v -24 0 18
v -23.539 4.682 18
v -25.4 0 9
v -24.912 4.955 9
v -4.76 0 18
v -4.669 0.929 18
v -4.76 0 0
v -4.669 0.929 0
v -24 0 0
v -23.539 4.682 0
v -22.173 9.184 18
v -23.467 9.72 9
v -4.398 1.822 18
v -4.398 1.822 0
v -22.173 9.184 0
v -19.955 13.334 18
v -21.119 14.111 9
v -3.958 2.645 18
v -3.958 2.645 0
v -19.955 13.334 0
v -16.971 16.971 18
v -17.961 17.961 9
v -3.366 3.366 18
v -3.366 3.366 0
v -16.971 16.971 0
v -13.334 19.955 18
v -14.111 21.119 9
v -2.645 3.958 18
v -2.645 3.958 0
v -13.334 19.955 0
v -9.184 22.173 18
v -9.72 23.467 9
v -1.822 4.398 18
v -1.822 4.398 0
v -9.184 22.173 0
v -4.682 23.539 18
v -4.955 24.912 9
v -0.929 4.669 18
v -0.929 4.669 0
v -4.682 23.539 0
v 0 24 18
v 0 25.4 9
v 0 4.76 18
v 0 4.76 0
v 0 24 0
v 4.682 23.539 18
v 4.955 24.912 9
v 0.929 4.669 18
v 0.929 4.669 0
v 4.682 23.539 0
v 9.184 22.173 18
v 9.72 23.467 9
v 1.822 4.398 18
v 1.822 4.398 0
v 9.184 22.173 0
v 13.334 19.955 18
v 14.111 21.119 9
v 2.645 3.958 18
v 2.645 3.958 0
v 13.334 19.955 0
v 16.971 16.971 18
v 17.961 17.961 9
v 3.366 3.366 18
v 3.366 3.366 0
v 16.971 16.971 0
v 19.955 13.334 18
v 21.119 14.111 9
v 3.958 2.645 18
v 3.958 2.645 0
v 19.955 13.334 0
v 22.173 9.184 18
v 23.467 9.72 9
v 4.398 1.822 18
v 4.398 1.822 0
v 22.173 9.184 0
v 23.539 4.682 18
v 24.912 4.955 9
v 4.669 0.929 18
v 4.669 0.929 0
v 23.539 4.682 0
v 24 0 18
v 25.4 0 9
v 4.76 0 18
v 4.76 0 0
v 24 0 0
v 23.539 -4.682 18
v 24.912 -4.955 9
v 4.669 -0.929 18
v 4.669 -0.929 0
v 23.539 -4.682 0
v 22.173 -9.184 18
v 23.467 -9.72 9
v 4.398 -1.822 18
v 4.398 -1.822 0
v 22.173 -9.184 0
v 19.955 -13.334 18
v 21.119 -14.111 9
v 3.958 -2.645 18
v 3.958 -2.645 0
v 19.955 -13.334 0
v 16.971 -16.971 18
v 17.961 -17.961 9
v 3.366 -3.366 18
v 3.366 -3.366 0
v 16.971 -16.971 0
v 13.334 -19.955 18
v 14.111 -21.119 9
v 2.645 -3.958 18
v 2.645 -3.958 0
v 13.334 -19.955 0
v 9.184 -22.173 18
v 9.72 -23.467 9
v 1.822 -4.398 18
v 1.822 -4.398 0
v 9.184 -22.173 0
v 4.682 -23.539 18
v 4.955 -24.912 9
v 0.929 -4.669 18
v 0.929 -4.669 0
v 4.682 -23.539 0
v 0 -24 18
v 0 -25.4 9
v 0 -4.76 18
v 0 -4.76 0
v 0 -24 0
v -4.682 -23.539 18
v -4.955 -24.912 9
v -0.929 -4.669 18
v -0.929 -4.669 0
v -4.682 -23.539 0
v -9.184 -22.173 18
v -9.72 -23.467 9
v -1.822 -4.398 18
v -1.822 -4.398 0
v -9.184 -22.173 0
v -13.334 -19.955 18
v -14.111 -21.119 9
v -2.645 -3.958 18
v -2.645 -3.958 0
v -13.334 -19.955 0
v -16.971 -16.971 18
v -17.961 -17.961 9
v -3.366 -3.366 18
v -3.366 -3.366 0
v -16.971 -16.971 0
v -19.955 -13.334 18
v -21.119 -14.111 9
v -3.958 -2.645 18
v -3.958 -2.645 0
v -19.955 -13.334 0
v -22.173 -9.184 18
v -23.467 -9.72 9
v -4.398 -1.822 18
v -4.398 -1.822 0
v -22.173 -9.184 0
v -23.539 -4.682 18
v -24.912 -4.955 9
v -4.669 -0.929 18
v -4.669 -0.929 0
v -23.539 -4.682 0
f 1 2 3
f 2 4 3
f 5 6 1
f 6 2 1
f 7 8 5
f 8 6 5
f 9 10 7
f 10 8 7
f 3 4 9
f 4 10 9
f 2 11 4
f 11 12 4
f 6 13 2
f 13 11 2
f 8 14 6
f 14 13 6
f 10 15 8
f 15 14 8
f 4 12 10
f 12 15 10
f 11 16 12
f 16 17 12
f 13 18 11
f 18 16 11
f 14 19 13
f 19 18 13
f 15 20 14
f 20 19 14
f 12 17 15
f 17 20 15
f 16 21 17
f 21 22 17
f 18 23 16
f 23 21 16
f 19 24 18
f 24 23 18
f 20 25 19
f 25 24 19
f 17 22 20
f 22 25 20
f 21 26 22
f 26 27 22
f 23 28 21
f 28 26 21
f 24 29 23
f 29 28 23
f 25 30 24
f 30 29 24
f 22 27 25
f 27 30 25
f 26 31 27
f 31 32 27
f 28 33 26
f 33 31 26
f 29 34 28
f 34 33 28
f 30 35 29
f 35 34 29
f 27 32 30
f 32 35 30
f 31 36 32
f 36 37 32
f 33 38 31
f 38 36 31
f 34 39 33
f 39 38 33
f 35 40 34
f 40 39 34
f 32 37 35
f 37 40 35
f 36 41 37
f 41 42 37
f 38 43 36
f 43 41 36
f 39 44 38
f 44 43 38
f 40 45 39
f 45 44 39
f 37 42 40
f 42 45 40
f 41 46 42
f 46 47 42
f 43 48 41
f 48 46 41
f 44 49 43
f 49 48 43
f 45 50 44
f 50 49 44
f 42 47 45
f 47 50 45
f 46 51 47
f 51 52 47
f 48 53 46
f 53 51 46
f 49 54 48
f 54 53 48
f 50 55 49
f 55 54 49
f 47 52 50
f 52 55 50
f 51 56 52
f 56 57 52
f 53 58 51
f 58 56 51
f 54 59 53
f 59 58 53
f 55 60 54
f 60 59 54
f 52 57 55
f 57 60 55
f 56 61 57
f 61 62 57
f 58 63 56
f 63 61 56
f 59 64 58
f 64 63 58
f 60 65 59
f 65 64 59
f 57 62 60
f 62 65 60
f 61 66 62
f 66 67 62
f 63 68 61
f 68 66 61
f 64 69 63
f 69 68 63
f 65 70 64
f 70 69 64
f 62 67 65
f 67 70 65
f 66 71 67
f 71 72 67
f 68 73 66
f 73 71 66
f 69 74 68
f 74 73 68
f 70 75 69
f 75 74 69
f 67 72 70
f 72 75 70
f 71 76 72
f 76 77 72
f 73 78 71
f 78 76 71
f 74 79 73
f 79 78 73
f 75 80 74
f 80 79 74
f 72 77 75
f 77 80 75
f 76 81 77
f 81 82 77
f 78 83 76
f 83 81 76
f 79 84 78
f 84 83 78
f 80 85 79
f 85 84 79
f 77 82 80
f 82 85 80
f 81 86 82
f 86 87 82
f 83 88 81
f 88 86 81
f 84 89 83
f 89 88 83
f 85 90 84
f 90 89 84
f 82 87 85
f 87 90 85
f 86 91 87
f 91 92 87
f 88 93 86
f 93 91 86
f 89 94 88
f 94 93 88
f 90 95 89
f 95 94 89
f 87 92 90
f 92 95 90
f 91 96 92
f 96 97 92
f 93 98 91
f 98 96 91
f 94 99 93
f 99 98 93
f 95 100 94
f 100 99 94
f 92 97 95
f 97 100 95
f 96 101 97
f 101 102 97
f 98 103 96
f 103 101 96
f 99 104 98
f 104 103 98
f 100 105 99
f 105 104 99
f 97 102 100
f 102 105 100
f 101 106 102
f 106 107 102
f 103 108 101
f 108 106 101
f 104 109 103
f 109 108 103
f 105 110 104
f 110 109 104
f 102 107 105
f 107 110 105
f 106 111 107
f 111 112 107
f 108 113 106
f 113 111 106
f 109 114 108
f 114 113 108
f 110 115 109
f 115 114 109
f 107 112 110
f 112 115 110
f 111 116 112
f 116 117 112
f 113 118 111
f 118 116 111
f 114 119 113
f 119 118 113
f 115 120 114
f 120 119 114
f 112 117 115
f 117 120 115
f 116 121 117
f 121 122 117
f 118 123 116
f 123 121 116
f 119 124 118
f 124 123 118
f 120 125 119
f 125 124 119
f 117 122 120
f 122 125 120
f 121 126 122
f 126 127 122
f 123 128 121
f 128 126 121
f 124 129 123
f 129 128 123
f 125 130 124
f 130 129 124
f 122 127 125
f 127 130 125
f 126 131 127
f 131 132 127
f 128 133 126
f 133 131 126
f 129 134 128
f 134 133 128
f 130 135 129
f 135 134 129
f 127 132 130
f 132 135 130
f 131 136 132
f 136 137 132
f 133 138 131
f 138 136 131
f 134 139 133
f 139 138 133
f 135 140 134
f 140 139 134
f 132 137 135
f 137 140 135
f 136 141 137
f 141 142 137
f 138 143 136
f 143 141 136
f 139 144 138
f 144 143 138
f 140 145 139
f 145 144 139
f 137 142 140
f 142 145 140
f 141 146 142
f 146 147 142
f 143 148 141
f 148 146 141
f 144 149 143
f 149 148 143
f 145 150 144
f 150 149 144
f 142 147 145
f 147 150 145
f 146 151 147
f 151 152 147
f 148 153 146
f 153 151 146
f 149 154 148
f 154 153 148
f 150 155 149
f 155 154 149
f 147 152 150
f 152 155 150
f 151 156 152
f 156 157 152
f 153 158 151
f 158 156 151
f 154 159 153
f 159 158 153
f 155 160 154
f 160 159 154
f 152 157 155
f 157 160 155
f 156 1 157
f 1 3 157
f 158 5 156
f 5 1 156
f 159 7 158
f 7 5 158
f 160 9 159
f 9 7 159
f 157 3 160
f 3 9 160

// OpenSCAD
$fn = 32;

// ----------------------------------------------------------------------
// Belt roller: 48 mm barrel, 18 mm wide, bore 9.52 mm
// ----------------------------------------------------------------------

// --- parameters (mm) ---
bore_d = 9.52;            // bore
barrel_d = 48;            // barrel diameter
roller_w = 18;            // roller width
crown = 1.4;              // crown height at mid width

roller_profile = [[4.76, 0], [24, 0], [25.4, 9], [24, 18], [4.76, 18]];

/* the profile stays clear of the axis, so the bore comes out of the revolve */
rotate_extrude() polygon(roller_profile);
